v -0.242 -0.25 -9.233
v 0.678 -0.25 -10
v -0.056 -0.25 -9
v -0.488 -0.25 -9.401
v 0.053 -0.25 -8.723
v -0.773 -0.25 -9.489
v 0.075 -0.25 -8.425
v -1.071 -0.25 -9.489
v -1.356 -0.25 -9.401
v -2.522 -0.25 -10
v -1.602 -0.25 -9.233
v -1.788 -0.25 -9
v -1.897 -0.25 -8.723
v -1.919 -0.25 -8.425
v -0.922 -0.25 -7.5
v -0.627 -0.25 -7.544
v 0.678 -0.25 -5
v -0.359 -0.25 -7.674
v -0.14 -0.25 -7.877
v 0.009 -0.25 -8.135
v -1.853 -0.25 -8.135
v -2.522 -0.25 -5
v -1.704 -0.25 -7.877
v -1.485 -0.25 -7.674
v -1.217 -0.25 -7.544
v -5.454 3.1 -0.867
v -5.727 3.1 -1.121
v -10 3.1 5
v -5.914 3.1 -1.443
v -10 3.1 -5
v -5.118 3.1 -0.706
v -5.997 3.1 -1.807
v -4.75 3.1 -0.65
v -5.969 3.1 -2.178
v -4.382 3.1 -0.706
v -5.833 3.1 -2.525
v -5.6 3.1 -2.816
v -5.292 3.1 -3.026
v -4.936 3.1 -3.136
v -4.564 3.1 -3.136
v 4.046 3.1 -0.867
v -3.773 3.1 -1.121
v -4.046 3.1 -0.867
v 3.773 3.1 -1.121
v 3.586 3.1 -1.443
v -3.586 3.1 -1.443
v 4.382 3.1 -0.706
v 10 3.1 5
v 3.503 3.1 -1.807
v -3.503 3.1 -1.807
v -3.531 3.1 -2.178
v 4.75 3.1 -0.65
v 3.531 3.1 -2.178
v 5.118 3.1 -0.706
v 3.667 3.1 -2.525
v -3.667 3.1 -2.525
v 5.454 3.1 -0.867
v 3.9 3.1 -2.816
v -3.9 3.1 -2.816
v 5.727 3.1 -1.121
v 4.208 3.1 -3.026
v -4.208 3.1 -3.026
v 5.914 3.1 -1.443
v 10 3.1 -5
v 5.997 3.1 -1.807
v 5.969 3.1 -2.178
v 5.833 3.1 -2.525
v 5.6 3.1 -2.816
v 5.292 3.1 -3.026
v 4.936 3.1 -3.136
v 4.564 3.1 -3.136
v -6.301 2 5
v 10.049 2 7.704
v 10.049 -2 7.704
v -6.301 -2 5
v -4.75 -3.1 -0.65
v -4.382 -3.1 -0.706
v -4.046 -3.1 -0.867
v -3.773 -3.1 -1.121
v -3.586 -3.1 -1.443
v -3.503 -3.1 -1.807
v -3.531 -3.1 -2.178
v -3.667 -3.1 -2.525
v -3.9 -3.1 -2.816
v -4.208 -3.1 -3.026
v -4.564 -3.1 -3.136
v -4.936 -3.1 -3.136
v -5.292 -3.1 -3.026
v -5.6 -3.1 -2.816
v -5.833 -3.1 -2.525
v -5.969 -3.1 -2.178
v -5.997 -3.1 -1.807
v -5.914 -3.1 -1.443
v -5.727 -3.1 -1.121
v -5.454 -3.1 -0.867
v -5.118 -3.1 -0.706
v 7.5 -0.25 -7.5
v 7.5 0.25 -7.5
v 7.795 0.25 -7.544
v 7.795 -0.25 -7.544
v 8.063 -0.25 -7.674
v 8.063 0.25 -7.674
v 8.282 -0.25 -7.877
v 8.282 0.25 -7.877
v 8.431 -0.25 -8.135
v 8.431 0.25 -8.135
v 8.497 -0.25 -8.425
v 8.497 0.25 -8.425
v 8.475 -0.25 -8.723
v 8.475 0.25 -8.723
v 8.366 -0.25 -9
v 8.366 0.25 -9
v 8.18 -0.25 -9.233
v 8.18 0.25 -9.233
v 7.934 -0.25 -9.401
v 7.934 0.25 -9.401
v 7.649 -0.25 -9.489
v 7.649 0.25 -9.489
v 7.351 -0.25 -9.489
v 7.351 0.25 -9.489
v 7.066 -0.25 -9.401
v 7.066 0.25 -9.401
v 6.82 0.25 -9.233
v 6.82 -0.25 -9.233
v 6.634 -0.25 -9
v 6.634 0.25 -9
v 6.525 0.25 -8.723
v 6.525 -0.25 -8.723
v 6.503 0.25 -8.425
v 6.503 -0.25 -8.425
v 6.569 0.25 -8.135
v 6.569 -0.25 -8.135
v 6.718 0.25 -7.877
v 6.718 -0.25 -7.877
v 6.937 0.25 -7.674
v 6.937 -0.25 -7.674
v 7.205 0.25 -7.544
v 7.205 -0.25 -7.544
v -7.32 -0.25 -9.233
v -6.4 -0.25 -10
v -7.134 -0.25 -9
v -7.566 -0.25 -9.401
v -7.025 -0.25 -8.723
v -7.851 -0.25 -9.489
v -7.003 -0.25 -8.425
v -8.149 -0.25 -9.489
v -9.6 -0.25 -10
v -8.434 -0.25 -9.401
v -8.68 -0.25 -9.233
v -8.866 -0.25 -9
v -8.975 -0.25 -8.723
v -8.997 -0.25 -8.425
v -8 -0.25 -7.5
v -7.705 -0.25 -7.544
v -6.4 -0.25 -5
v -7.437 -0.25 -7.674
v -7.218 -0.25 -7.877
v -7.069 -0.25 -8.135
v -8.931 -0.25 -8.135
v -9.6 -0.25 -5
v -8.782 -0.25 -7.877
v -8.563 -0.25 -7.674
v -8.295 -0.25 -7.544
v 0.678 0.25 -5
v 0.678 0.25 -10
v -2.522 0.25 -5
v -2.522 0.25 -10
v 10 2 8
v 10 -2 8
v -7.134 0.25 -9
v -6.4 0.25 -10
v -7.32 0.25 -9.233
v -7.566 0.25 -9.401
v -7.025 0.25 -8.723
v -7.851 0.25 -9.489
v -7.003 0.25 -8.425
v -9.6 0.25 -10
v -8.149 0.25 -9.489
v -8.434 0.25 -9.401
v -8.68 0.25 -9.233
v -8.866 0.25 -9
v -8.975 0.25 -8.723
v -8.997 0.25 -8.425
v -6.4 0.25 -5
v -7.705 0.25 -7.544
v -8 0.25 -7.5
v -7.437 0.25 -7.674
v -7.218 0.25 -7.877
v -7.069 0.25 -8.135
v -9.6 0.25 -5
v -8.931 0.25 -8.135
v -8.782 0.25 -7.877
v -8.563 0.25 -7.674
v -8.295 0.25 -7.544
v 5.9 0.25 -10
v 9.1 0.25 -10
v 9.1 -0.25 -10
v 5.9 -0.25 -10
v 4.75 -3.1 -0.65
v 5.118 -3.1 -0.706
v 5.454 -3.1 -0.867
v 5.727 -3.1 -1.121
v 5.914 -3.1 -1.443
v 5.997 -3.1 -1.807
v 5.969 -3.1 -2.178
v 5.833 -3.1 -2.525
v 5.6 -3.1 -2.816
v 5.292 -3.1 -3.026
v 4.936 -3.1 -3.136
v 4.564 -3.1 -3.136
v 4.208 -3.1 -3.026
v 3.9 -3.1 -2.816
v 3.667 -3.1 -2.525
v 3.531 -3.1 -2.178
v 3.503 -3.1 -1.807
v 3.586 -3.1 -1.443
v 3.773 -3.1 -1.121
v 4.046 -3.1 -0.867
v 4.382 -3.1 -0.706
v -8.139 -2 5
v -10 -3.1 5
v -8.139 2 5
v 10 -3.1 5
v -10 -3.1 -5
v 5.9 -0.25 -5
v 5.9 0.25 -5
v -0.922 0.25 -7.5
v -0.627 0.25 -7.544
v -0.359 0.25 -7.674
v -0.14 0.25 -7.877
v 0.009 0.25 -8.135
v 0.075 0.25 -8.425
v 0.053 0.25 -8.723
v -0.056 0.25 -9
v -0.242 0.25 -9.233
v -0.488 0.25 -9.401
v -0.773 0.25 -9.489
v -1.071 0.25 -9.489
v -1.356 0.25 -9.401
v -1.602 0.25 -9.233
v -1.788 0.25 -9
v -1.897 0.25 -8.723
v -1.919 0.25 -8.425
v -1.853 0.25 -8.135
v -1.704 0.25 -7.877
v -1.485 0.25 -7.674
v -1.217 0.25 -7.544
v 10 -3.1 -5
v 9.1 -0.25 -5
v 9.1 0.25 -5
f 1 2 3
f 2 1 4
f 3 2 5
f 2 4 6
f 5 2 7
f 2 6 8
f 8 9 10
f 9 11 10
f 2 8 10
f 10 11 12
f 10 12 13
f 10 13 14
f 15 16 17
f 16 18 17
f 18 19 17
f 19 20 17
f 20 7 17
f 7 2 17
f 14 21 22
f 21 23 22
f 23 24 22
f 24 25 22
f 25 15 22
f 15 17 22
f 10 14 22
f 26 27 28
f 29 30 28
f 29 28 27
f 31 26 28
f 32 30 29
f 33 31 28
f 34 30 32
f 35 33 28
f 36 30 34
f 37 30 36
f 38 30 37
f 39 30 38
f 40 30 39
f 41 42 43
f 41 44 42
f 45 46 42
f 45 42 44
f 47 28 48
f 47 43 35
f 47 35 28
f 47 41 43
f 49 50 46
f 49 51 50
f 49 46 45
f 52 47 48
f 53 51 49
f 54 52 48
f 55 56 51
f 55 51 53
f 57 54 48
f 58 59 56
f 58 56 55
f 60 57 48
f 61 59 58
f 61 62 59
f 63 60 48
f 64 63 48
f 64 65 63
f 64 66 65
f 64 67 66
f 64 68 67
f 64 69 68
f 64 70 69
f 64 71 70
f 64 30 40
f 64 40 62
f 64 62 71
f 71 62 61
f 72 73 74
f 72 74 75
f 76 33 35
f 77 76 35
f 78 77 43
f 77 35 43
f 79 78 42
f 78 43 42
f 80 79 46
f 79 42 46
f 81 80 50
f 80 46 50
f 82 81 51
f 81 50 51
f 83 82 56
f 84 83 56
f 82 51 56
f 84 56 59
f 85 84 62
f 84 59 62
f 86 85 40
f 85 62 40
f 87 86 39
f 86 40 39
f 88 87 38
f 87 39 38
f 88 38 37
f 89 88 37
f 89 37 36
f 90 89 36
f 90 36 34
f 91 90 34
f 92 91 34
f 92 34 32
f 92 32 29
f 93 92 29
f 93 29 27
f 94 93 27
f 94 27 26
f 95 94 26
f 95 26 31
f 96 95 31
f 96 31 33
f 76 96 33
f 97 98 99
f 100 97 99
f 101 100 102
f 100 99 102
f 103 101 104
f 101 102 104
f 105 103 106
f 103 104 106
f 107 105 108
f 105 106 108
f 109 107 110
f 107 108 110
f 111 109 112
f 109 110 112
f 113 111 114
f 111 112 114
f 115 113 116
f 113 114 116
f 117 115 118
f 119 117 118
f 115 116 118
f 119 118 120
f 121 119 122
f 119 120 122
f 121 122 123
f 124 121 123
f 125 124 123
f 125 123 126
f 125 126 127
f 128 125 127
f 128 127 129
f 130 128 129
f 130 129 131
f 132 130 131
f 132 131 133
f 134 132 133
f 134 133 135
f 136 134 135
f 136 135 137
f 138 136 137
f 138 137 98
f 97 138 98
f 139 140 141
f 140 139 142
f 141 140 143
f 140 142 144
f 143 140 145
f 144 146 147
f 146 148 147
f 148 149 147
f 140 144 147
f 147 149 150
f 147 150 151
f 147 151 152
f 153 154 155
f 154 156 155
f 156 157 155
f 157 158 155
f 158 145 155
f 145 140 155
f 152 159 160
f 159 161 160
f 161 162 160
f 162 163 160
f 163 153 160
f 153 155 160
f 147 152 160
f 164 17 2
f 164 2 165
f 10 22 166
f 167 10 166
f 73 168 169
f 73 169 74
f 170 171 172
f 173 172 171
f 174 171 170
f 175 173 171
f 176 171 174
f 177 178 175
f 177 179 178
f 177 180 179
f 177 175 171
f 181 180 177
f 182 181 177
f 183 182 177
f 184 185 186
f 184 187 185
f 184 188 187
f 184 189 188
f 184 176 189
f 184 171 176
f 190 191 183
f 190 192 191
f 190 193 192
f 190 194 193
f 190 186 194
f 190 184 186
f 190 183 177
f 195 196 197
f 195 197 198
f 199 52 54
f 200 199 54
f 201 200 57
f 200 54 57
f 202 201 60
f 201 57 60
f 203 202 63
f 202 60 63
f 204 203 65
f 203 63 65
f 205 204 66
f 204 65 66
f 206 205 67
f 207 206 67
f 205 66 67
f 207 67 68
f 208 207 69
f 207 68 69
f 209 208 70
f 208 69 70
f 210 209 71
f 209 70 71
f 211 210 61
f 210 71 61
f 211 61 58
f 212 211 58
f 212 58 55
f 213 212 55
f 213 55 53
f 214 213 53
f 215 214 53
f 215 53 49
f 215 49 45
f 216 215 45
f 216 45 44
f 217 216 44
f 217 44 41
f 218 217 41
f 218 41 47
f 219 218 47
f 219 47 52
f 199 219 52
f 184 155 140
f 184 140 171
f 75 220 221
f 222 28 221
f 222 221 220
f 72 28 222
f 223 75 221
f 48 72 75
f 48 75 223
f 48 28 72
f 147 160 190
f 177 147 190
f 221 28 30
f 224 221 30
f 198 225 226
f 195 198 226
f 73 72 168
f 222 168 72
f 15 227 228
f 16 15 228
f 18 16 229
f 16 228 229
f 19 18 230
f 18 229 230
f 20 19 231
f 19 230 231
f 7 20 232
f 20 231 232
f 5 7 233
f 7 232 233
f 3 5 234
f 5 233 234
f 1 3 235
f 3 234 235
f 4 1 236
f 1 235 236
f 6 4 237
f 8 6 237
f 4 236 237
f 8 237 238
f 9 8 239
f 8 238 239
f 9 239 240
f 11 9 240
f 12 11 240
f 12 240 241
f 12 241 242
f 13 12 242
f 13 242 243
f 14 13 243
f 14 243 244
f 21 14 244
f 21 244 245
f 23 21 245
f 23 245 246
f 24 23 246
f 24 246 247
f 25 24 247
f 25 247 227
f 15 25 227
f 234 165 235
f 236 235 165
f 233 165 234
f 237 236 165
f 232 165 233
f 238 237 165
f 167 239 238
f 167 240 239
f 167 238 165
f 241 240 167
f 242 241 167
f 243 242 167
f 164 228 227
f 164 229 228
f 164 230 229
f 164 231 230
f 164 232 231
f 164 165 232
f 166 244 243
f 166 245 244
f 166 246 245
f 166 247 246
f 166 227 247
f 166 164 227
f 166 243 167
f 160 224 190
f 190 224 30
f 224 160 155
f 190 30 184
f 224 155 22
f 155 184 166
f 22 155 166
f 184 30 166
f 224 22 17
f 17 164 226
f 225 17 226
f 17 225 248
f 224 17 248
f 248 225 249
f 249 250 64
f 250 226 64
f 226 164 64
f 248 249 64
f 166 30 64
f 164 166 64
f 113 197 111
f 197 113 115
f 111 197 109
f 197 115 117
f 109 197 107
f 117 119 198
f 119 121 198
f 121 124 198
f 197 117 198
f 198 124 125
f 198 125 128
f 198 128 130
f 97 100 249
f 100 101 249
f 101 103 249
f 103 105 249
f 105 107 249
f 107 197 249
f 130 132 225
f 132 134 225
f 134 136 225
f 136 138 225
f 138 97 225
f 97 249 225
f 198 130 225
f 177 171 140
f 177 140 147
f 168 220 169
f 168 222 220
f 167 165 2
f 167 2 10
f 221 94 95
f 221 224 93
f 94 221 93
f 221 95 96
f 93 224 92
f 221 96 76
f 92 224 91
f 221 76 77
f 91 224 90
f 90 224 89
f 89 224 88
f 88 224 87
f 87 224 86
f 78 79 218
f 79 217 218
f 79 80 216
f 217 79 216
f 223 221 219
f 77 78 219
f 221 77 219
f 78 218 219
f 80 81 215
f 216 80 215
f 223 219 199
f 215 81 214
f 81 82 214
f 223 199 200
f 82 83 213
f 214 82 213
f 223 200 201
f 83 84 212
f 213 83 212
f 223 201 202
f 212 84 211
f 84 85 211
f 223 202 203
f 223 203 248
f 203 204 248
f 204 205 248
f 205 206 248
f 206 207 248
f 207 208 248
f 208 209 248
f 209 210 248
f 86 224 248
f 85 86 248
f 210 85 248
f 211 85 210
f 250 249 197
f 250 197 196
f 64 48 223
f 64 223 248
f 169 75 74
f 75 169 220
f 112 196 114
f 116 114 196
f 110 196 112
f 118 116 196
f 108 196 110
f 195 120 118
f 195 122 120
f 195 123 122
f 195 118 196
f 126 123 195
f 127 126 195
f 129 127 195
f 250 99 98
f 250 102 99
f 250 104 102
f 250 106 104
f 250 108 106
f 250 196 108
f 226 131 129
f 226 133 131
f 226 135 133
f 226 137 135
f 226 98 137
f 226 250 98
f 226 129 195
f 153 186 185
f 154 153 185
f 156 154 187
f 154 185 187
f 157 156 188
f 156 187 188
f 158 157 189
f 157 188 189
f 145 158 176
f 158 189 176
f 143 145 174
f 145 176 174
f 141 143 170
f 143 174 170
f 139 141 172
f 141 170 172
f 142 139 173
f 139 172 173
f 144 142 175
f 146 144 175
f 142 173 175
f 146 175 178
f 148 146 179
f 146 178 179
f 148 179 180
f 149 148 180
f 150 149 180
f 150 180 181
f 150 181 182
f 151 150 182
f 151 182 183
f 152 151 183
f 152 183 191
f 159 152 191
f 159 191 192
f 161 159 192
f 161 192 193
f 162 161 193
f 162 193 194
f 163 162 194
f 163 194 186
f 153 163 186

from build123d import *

# Parameters (mm, degrees)
SKETCH1_W           = 20
SKETCH1_H           = 10
BOSS_EXTRUDE1_DEPTH = 3.1
BOSS_EXTRUDE3_DEPTH = 2
SKETCH4_W           = 3.2
SKETCH4_H           = 0.5
BOSS_EXTRUDE4_DEPTH = 5
SKETCH7_R           = 1
CUT_EXTRUDE1_DEPTH  = 5
SKETCH8_R           = 1.25
CUT_EXTRUDE2_DEPTH  = 16.473248494


with BuildPart() as part:
    # Sketch1 → Boss-Extrude1 (new, symmetric)
    with BuildSketch(Plane(origin=(0, 0, 0), x_dir=(1, 0, 0), z_dir=(0, 1, 0))):
        Rectangle(SKETCH1_W, SKETCH1_H)
    extrude(amount=BOSS_EXTRUDE1_DEPTH, both=True)

    # Sketch3 → Boss-Extrude3 (add, symmetric)
    with BuildSketch(Plane(origin=(0, 0, 0), x_dir=(1, 0, 0), z_dir=(0, 1, 0))):
        Polygon((-8.139274181, -5), (10, -8), (10.048951137, -7.704020632), (-6.300706076, -5), align=None)
    extrude(amount=BOSS_EXTRUDE3_DEPTH, both=True)

    # Sketch4 → Boss-Extrude4 (add)
    with BuildSketch(Plane(origin=(0, 0, -5), x_dir=(-1, 0, 0), z_dir=(0, 0, -1))):
        with Locations((-7.5, 0)):
            Rectangle(SKETCH4_W, SKETCH4_H)
        with Locations((0.921991111, 0)):
            Rectangle(SKETCH4_W, SKETCH4_H)
        with Locations((8, 0)):
            Rectangle(SKETCH4_W, SKETCH4_H)
    extrude(amount=BOSS_EXTRUDE4_DEPTH)

    # Sketch7 → Cut-Extrude1 (cut)
    with BuildSketch(Plane(origin=(0, 0.25, 0), x_dir=(1, 0, 0), z_dir=(0, 1, 0))):
        with Locations(Location((-8, 8.5, 0), (0, 0, 270))):
            Circle(SKETCH7_R)
        with Locations(Location((-0.921991111, 8.5, 0), (0, 0, 270))):
            Circle(SKETCH7_R)
        with Locations(Location((7.5, 8.5, 0), (0, 0, 270))):
            Circle(SKETCH7_R)
    extrude(amount=-CUT_EXTRUDE1_DEPTH, mode=Mode.SUBTRACT)

    # Sketch8 → Cut-Extrude2 (cut, through all)
    with BuildSketch(Plane(origin=(0, 3.1, 0), x_dir=(1, 0, 0), z_dir=(0, 1, 0))):
        with Locations(Location((-4.75, 1.9, 0), (0, 0, 270))):
            Circle(SKETCH8_R)
        with Locations(Location((4.75, 1.9, 0), (0, 0, 270))):
            Circle(SKETCH8_R)
    extrude(amount=-CUT_EXTRUDE2_DEPTH, mode=Mode.SUBTRACT)


solid = part.part
